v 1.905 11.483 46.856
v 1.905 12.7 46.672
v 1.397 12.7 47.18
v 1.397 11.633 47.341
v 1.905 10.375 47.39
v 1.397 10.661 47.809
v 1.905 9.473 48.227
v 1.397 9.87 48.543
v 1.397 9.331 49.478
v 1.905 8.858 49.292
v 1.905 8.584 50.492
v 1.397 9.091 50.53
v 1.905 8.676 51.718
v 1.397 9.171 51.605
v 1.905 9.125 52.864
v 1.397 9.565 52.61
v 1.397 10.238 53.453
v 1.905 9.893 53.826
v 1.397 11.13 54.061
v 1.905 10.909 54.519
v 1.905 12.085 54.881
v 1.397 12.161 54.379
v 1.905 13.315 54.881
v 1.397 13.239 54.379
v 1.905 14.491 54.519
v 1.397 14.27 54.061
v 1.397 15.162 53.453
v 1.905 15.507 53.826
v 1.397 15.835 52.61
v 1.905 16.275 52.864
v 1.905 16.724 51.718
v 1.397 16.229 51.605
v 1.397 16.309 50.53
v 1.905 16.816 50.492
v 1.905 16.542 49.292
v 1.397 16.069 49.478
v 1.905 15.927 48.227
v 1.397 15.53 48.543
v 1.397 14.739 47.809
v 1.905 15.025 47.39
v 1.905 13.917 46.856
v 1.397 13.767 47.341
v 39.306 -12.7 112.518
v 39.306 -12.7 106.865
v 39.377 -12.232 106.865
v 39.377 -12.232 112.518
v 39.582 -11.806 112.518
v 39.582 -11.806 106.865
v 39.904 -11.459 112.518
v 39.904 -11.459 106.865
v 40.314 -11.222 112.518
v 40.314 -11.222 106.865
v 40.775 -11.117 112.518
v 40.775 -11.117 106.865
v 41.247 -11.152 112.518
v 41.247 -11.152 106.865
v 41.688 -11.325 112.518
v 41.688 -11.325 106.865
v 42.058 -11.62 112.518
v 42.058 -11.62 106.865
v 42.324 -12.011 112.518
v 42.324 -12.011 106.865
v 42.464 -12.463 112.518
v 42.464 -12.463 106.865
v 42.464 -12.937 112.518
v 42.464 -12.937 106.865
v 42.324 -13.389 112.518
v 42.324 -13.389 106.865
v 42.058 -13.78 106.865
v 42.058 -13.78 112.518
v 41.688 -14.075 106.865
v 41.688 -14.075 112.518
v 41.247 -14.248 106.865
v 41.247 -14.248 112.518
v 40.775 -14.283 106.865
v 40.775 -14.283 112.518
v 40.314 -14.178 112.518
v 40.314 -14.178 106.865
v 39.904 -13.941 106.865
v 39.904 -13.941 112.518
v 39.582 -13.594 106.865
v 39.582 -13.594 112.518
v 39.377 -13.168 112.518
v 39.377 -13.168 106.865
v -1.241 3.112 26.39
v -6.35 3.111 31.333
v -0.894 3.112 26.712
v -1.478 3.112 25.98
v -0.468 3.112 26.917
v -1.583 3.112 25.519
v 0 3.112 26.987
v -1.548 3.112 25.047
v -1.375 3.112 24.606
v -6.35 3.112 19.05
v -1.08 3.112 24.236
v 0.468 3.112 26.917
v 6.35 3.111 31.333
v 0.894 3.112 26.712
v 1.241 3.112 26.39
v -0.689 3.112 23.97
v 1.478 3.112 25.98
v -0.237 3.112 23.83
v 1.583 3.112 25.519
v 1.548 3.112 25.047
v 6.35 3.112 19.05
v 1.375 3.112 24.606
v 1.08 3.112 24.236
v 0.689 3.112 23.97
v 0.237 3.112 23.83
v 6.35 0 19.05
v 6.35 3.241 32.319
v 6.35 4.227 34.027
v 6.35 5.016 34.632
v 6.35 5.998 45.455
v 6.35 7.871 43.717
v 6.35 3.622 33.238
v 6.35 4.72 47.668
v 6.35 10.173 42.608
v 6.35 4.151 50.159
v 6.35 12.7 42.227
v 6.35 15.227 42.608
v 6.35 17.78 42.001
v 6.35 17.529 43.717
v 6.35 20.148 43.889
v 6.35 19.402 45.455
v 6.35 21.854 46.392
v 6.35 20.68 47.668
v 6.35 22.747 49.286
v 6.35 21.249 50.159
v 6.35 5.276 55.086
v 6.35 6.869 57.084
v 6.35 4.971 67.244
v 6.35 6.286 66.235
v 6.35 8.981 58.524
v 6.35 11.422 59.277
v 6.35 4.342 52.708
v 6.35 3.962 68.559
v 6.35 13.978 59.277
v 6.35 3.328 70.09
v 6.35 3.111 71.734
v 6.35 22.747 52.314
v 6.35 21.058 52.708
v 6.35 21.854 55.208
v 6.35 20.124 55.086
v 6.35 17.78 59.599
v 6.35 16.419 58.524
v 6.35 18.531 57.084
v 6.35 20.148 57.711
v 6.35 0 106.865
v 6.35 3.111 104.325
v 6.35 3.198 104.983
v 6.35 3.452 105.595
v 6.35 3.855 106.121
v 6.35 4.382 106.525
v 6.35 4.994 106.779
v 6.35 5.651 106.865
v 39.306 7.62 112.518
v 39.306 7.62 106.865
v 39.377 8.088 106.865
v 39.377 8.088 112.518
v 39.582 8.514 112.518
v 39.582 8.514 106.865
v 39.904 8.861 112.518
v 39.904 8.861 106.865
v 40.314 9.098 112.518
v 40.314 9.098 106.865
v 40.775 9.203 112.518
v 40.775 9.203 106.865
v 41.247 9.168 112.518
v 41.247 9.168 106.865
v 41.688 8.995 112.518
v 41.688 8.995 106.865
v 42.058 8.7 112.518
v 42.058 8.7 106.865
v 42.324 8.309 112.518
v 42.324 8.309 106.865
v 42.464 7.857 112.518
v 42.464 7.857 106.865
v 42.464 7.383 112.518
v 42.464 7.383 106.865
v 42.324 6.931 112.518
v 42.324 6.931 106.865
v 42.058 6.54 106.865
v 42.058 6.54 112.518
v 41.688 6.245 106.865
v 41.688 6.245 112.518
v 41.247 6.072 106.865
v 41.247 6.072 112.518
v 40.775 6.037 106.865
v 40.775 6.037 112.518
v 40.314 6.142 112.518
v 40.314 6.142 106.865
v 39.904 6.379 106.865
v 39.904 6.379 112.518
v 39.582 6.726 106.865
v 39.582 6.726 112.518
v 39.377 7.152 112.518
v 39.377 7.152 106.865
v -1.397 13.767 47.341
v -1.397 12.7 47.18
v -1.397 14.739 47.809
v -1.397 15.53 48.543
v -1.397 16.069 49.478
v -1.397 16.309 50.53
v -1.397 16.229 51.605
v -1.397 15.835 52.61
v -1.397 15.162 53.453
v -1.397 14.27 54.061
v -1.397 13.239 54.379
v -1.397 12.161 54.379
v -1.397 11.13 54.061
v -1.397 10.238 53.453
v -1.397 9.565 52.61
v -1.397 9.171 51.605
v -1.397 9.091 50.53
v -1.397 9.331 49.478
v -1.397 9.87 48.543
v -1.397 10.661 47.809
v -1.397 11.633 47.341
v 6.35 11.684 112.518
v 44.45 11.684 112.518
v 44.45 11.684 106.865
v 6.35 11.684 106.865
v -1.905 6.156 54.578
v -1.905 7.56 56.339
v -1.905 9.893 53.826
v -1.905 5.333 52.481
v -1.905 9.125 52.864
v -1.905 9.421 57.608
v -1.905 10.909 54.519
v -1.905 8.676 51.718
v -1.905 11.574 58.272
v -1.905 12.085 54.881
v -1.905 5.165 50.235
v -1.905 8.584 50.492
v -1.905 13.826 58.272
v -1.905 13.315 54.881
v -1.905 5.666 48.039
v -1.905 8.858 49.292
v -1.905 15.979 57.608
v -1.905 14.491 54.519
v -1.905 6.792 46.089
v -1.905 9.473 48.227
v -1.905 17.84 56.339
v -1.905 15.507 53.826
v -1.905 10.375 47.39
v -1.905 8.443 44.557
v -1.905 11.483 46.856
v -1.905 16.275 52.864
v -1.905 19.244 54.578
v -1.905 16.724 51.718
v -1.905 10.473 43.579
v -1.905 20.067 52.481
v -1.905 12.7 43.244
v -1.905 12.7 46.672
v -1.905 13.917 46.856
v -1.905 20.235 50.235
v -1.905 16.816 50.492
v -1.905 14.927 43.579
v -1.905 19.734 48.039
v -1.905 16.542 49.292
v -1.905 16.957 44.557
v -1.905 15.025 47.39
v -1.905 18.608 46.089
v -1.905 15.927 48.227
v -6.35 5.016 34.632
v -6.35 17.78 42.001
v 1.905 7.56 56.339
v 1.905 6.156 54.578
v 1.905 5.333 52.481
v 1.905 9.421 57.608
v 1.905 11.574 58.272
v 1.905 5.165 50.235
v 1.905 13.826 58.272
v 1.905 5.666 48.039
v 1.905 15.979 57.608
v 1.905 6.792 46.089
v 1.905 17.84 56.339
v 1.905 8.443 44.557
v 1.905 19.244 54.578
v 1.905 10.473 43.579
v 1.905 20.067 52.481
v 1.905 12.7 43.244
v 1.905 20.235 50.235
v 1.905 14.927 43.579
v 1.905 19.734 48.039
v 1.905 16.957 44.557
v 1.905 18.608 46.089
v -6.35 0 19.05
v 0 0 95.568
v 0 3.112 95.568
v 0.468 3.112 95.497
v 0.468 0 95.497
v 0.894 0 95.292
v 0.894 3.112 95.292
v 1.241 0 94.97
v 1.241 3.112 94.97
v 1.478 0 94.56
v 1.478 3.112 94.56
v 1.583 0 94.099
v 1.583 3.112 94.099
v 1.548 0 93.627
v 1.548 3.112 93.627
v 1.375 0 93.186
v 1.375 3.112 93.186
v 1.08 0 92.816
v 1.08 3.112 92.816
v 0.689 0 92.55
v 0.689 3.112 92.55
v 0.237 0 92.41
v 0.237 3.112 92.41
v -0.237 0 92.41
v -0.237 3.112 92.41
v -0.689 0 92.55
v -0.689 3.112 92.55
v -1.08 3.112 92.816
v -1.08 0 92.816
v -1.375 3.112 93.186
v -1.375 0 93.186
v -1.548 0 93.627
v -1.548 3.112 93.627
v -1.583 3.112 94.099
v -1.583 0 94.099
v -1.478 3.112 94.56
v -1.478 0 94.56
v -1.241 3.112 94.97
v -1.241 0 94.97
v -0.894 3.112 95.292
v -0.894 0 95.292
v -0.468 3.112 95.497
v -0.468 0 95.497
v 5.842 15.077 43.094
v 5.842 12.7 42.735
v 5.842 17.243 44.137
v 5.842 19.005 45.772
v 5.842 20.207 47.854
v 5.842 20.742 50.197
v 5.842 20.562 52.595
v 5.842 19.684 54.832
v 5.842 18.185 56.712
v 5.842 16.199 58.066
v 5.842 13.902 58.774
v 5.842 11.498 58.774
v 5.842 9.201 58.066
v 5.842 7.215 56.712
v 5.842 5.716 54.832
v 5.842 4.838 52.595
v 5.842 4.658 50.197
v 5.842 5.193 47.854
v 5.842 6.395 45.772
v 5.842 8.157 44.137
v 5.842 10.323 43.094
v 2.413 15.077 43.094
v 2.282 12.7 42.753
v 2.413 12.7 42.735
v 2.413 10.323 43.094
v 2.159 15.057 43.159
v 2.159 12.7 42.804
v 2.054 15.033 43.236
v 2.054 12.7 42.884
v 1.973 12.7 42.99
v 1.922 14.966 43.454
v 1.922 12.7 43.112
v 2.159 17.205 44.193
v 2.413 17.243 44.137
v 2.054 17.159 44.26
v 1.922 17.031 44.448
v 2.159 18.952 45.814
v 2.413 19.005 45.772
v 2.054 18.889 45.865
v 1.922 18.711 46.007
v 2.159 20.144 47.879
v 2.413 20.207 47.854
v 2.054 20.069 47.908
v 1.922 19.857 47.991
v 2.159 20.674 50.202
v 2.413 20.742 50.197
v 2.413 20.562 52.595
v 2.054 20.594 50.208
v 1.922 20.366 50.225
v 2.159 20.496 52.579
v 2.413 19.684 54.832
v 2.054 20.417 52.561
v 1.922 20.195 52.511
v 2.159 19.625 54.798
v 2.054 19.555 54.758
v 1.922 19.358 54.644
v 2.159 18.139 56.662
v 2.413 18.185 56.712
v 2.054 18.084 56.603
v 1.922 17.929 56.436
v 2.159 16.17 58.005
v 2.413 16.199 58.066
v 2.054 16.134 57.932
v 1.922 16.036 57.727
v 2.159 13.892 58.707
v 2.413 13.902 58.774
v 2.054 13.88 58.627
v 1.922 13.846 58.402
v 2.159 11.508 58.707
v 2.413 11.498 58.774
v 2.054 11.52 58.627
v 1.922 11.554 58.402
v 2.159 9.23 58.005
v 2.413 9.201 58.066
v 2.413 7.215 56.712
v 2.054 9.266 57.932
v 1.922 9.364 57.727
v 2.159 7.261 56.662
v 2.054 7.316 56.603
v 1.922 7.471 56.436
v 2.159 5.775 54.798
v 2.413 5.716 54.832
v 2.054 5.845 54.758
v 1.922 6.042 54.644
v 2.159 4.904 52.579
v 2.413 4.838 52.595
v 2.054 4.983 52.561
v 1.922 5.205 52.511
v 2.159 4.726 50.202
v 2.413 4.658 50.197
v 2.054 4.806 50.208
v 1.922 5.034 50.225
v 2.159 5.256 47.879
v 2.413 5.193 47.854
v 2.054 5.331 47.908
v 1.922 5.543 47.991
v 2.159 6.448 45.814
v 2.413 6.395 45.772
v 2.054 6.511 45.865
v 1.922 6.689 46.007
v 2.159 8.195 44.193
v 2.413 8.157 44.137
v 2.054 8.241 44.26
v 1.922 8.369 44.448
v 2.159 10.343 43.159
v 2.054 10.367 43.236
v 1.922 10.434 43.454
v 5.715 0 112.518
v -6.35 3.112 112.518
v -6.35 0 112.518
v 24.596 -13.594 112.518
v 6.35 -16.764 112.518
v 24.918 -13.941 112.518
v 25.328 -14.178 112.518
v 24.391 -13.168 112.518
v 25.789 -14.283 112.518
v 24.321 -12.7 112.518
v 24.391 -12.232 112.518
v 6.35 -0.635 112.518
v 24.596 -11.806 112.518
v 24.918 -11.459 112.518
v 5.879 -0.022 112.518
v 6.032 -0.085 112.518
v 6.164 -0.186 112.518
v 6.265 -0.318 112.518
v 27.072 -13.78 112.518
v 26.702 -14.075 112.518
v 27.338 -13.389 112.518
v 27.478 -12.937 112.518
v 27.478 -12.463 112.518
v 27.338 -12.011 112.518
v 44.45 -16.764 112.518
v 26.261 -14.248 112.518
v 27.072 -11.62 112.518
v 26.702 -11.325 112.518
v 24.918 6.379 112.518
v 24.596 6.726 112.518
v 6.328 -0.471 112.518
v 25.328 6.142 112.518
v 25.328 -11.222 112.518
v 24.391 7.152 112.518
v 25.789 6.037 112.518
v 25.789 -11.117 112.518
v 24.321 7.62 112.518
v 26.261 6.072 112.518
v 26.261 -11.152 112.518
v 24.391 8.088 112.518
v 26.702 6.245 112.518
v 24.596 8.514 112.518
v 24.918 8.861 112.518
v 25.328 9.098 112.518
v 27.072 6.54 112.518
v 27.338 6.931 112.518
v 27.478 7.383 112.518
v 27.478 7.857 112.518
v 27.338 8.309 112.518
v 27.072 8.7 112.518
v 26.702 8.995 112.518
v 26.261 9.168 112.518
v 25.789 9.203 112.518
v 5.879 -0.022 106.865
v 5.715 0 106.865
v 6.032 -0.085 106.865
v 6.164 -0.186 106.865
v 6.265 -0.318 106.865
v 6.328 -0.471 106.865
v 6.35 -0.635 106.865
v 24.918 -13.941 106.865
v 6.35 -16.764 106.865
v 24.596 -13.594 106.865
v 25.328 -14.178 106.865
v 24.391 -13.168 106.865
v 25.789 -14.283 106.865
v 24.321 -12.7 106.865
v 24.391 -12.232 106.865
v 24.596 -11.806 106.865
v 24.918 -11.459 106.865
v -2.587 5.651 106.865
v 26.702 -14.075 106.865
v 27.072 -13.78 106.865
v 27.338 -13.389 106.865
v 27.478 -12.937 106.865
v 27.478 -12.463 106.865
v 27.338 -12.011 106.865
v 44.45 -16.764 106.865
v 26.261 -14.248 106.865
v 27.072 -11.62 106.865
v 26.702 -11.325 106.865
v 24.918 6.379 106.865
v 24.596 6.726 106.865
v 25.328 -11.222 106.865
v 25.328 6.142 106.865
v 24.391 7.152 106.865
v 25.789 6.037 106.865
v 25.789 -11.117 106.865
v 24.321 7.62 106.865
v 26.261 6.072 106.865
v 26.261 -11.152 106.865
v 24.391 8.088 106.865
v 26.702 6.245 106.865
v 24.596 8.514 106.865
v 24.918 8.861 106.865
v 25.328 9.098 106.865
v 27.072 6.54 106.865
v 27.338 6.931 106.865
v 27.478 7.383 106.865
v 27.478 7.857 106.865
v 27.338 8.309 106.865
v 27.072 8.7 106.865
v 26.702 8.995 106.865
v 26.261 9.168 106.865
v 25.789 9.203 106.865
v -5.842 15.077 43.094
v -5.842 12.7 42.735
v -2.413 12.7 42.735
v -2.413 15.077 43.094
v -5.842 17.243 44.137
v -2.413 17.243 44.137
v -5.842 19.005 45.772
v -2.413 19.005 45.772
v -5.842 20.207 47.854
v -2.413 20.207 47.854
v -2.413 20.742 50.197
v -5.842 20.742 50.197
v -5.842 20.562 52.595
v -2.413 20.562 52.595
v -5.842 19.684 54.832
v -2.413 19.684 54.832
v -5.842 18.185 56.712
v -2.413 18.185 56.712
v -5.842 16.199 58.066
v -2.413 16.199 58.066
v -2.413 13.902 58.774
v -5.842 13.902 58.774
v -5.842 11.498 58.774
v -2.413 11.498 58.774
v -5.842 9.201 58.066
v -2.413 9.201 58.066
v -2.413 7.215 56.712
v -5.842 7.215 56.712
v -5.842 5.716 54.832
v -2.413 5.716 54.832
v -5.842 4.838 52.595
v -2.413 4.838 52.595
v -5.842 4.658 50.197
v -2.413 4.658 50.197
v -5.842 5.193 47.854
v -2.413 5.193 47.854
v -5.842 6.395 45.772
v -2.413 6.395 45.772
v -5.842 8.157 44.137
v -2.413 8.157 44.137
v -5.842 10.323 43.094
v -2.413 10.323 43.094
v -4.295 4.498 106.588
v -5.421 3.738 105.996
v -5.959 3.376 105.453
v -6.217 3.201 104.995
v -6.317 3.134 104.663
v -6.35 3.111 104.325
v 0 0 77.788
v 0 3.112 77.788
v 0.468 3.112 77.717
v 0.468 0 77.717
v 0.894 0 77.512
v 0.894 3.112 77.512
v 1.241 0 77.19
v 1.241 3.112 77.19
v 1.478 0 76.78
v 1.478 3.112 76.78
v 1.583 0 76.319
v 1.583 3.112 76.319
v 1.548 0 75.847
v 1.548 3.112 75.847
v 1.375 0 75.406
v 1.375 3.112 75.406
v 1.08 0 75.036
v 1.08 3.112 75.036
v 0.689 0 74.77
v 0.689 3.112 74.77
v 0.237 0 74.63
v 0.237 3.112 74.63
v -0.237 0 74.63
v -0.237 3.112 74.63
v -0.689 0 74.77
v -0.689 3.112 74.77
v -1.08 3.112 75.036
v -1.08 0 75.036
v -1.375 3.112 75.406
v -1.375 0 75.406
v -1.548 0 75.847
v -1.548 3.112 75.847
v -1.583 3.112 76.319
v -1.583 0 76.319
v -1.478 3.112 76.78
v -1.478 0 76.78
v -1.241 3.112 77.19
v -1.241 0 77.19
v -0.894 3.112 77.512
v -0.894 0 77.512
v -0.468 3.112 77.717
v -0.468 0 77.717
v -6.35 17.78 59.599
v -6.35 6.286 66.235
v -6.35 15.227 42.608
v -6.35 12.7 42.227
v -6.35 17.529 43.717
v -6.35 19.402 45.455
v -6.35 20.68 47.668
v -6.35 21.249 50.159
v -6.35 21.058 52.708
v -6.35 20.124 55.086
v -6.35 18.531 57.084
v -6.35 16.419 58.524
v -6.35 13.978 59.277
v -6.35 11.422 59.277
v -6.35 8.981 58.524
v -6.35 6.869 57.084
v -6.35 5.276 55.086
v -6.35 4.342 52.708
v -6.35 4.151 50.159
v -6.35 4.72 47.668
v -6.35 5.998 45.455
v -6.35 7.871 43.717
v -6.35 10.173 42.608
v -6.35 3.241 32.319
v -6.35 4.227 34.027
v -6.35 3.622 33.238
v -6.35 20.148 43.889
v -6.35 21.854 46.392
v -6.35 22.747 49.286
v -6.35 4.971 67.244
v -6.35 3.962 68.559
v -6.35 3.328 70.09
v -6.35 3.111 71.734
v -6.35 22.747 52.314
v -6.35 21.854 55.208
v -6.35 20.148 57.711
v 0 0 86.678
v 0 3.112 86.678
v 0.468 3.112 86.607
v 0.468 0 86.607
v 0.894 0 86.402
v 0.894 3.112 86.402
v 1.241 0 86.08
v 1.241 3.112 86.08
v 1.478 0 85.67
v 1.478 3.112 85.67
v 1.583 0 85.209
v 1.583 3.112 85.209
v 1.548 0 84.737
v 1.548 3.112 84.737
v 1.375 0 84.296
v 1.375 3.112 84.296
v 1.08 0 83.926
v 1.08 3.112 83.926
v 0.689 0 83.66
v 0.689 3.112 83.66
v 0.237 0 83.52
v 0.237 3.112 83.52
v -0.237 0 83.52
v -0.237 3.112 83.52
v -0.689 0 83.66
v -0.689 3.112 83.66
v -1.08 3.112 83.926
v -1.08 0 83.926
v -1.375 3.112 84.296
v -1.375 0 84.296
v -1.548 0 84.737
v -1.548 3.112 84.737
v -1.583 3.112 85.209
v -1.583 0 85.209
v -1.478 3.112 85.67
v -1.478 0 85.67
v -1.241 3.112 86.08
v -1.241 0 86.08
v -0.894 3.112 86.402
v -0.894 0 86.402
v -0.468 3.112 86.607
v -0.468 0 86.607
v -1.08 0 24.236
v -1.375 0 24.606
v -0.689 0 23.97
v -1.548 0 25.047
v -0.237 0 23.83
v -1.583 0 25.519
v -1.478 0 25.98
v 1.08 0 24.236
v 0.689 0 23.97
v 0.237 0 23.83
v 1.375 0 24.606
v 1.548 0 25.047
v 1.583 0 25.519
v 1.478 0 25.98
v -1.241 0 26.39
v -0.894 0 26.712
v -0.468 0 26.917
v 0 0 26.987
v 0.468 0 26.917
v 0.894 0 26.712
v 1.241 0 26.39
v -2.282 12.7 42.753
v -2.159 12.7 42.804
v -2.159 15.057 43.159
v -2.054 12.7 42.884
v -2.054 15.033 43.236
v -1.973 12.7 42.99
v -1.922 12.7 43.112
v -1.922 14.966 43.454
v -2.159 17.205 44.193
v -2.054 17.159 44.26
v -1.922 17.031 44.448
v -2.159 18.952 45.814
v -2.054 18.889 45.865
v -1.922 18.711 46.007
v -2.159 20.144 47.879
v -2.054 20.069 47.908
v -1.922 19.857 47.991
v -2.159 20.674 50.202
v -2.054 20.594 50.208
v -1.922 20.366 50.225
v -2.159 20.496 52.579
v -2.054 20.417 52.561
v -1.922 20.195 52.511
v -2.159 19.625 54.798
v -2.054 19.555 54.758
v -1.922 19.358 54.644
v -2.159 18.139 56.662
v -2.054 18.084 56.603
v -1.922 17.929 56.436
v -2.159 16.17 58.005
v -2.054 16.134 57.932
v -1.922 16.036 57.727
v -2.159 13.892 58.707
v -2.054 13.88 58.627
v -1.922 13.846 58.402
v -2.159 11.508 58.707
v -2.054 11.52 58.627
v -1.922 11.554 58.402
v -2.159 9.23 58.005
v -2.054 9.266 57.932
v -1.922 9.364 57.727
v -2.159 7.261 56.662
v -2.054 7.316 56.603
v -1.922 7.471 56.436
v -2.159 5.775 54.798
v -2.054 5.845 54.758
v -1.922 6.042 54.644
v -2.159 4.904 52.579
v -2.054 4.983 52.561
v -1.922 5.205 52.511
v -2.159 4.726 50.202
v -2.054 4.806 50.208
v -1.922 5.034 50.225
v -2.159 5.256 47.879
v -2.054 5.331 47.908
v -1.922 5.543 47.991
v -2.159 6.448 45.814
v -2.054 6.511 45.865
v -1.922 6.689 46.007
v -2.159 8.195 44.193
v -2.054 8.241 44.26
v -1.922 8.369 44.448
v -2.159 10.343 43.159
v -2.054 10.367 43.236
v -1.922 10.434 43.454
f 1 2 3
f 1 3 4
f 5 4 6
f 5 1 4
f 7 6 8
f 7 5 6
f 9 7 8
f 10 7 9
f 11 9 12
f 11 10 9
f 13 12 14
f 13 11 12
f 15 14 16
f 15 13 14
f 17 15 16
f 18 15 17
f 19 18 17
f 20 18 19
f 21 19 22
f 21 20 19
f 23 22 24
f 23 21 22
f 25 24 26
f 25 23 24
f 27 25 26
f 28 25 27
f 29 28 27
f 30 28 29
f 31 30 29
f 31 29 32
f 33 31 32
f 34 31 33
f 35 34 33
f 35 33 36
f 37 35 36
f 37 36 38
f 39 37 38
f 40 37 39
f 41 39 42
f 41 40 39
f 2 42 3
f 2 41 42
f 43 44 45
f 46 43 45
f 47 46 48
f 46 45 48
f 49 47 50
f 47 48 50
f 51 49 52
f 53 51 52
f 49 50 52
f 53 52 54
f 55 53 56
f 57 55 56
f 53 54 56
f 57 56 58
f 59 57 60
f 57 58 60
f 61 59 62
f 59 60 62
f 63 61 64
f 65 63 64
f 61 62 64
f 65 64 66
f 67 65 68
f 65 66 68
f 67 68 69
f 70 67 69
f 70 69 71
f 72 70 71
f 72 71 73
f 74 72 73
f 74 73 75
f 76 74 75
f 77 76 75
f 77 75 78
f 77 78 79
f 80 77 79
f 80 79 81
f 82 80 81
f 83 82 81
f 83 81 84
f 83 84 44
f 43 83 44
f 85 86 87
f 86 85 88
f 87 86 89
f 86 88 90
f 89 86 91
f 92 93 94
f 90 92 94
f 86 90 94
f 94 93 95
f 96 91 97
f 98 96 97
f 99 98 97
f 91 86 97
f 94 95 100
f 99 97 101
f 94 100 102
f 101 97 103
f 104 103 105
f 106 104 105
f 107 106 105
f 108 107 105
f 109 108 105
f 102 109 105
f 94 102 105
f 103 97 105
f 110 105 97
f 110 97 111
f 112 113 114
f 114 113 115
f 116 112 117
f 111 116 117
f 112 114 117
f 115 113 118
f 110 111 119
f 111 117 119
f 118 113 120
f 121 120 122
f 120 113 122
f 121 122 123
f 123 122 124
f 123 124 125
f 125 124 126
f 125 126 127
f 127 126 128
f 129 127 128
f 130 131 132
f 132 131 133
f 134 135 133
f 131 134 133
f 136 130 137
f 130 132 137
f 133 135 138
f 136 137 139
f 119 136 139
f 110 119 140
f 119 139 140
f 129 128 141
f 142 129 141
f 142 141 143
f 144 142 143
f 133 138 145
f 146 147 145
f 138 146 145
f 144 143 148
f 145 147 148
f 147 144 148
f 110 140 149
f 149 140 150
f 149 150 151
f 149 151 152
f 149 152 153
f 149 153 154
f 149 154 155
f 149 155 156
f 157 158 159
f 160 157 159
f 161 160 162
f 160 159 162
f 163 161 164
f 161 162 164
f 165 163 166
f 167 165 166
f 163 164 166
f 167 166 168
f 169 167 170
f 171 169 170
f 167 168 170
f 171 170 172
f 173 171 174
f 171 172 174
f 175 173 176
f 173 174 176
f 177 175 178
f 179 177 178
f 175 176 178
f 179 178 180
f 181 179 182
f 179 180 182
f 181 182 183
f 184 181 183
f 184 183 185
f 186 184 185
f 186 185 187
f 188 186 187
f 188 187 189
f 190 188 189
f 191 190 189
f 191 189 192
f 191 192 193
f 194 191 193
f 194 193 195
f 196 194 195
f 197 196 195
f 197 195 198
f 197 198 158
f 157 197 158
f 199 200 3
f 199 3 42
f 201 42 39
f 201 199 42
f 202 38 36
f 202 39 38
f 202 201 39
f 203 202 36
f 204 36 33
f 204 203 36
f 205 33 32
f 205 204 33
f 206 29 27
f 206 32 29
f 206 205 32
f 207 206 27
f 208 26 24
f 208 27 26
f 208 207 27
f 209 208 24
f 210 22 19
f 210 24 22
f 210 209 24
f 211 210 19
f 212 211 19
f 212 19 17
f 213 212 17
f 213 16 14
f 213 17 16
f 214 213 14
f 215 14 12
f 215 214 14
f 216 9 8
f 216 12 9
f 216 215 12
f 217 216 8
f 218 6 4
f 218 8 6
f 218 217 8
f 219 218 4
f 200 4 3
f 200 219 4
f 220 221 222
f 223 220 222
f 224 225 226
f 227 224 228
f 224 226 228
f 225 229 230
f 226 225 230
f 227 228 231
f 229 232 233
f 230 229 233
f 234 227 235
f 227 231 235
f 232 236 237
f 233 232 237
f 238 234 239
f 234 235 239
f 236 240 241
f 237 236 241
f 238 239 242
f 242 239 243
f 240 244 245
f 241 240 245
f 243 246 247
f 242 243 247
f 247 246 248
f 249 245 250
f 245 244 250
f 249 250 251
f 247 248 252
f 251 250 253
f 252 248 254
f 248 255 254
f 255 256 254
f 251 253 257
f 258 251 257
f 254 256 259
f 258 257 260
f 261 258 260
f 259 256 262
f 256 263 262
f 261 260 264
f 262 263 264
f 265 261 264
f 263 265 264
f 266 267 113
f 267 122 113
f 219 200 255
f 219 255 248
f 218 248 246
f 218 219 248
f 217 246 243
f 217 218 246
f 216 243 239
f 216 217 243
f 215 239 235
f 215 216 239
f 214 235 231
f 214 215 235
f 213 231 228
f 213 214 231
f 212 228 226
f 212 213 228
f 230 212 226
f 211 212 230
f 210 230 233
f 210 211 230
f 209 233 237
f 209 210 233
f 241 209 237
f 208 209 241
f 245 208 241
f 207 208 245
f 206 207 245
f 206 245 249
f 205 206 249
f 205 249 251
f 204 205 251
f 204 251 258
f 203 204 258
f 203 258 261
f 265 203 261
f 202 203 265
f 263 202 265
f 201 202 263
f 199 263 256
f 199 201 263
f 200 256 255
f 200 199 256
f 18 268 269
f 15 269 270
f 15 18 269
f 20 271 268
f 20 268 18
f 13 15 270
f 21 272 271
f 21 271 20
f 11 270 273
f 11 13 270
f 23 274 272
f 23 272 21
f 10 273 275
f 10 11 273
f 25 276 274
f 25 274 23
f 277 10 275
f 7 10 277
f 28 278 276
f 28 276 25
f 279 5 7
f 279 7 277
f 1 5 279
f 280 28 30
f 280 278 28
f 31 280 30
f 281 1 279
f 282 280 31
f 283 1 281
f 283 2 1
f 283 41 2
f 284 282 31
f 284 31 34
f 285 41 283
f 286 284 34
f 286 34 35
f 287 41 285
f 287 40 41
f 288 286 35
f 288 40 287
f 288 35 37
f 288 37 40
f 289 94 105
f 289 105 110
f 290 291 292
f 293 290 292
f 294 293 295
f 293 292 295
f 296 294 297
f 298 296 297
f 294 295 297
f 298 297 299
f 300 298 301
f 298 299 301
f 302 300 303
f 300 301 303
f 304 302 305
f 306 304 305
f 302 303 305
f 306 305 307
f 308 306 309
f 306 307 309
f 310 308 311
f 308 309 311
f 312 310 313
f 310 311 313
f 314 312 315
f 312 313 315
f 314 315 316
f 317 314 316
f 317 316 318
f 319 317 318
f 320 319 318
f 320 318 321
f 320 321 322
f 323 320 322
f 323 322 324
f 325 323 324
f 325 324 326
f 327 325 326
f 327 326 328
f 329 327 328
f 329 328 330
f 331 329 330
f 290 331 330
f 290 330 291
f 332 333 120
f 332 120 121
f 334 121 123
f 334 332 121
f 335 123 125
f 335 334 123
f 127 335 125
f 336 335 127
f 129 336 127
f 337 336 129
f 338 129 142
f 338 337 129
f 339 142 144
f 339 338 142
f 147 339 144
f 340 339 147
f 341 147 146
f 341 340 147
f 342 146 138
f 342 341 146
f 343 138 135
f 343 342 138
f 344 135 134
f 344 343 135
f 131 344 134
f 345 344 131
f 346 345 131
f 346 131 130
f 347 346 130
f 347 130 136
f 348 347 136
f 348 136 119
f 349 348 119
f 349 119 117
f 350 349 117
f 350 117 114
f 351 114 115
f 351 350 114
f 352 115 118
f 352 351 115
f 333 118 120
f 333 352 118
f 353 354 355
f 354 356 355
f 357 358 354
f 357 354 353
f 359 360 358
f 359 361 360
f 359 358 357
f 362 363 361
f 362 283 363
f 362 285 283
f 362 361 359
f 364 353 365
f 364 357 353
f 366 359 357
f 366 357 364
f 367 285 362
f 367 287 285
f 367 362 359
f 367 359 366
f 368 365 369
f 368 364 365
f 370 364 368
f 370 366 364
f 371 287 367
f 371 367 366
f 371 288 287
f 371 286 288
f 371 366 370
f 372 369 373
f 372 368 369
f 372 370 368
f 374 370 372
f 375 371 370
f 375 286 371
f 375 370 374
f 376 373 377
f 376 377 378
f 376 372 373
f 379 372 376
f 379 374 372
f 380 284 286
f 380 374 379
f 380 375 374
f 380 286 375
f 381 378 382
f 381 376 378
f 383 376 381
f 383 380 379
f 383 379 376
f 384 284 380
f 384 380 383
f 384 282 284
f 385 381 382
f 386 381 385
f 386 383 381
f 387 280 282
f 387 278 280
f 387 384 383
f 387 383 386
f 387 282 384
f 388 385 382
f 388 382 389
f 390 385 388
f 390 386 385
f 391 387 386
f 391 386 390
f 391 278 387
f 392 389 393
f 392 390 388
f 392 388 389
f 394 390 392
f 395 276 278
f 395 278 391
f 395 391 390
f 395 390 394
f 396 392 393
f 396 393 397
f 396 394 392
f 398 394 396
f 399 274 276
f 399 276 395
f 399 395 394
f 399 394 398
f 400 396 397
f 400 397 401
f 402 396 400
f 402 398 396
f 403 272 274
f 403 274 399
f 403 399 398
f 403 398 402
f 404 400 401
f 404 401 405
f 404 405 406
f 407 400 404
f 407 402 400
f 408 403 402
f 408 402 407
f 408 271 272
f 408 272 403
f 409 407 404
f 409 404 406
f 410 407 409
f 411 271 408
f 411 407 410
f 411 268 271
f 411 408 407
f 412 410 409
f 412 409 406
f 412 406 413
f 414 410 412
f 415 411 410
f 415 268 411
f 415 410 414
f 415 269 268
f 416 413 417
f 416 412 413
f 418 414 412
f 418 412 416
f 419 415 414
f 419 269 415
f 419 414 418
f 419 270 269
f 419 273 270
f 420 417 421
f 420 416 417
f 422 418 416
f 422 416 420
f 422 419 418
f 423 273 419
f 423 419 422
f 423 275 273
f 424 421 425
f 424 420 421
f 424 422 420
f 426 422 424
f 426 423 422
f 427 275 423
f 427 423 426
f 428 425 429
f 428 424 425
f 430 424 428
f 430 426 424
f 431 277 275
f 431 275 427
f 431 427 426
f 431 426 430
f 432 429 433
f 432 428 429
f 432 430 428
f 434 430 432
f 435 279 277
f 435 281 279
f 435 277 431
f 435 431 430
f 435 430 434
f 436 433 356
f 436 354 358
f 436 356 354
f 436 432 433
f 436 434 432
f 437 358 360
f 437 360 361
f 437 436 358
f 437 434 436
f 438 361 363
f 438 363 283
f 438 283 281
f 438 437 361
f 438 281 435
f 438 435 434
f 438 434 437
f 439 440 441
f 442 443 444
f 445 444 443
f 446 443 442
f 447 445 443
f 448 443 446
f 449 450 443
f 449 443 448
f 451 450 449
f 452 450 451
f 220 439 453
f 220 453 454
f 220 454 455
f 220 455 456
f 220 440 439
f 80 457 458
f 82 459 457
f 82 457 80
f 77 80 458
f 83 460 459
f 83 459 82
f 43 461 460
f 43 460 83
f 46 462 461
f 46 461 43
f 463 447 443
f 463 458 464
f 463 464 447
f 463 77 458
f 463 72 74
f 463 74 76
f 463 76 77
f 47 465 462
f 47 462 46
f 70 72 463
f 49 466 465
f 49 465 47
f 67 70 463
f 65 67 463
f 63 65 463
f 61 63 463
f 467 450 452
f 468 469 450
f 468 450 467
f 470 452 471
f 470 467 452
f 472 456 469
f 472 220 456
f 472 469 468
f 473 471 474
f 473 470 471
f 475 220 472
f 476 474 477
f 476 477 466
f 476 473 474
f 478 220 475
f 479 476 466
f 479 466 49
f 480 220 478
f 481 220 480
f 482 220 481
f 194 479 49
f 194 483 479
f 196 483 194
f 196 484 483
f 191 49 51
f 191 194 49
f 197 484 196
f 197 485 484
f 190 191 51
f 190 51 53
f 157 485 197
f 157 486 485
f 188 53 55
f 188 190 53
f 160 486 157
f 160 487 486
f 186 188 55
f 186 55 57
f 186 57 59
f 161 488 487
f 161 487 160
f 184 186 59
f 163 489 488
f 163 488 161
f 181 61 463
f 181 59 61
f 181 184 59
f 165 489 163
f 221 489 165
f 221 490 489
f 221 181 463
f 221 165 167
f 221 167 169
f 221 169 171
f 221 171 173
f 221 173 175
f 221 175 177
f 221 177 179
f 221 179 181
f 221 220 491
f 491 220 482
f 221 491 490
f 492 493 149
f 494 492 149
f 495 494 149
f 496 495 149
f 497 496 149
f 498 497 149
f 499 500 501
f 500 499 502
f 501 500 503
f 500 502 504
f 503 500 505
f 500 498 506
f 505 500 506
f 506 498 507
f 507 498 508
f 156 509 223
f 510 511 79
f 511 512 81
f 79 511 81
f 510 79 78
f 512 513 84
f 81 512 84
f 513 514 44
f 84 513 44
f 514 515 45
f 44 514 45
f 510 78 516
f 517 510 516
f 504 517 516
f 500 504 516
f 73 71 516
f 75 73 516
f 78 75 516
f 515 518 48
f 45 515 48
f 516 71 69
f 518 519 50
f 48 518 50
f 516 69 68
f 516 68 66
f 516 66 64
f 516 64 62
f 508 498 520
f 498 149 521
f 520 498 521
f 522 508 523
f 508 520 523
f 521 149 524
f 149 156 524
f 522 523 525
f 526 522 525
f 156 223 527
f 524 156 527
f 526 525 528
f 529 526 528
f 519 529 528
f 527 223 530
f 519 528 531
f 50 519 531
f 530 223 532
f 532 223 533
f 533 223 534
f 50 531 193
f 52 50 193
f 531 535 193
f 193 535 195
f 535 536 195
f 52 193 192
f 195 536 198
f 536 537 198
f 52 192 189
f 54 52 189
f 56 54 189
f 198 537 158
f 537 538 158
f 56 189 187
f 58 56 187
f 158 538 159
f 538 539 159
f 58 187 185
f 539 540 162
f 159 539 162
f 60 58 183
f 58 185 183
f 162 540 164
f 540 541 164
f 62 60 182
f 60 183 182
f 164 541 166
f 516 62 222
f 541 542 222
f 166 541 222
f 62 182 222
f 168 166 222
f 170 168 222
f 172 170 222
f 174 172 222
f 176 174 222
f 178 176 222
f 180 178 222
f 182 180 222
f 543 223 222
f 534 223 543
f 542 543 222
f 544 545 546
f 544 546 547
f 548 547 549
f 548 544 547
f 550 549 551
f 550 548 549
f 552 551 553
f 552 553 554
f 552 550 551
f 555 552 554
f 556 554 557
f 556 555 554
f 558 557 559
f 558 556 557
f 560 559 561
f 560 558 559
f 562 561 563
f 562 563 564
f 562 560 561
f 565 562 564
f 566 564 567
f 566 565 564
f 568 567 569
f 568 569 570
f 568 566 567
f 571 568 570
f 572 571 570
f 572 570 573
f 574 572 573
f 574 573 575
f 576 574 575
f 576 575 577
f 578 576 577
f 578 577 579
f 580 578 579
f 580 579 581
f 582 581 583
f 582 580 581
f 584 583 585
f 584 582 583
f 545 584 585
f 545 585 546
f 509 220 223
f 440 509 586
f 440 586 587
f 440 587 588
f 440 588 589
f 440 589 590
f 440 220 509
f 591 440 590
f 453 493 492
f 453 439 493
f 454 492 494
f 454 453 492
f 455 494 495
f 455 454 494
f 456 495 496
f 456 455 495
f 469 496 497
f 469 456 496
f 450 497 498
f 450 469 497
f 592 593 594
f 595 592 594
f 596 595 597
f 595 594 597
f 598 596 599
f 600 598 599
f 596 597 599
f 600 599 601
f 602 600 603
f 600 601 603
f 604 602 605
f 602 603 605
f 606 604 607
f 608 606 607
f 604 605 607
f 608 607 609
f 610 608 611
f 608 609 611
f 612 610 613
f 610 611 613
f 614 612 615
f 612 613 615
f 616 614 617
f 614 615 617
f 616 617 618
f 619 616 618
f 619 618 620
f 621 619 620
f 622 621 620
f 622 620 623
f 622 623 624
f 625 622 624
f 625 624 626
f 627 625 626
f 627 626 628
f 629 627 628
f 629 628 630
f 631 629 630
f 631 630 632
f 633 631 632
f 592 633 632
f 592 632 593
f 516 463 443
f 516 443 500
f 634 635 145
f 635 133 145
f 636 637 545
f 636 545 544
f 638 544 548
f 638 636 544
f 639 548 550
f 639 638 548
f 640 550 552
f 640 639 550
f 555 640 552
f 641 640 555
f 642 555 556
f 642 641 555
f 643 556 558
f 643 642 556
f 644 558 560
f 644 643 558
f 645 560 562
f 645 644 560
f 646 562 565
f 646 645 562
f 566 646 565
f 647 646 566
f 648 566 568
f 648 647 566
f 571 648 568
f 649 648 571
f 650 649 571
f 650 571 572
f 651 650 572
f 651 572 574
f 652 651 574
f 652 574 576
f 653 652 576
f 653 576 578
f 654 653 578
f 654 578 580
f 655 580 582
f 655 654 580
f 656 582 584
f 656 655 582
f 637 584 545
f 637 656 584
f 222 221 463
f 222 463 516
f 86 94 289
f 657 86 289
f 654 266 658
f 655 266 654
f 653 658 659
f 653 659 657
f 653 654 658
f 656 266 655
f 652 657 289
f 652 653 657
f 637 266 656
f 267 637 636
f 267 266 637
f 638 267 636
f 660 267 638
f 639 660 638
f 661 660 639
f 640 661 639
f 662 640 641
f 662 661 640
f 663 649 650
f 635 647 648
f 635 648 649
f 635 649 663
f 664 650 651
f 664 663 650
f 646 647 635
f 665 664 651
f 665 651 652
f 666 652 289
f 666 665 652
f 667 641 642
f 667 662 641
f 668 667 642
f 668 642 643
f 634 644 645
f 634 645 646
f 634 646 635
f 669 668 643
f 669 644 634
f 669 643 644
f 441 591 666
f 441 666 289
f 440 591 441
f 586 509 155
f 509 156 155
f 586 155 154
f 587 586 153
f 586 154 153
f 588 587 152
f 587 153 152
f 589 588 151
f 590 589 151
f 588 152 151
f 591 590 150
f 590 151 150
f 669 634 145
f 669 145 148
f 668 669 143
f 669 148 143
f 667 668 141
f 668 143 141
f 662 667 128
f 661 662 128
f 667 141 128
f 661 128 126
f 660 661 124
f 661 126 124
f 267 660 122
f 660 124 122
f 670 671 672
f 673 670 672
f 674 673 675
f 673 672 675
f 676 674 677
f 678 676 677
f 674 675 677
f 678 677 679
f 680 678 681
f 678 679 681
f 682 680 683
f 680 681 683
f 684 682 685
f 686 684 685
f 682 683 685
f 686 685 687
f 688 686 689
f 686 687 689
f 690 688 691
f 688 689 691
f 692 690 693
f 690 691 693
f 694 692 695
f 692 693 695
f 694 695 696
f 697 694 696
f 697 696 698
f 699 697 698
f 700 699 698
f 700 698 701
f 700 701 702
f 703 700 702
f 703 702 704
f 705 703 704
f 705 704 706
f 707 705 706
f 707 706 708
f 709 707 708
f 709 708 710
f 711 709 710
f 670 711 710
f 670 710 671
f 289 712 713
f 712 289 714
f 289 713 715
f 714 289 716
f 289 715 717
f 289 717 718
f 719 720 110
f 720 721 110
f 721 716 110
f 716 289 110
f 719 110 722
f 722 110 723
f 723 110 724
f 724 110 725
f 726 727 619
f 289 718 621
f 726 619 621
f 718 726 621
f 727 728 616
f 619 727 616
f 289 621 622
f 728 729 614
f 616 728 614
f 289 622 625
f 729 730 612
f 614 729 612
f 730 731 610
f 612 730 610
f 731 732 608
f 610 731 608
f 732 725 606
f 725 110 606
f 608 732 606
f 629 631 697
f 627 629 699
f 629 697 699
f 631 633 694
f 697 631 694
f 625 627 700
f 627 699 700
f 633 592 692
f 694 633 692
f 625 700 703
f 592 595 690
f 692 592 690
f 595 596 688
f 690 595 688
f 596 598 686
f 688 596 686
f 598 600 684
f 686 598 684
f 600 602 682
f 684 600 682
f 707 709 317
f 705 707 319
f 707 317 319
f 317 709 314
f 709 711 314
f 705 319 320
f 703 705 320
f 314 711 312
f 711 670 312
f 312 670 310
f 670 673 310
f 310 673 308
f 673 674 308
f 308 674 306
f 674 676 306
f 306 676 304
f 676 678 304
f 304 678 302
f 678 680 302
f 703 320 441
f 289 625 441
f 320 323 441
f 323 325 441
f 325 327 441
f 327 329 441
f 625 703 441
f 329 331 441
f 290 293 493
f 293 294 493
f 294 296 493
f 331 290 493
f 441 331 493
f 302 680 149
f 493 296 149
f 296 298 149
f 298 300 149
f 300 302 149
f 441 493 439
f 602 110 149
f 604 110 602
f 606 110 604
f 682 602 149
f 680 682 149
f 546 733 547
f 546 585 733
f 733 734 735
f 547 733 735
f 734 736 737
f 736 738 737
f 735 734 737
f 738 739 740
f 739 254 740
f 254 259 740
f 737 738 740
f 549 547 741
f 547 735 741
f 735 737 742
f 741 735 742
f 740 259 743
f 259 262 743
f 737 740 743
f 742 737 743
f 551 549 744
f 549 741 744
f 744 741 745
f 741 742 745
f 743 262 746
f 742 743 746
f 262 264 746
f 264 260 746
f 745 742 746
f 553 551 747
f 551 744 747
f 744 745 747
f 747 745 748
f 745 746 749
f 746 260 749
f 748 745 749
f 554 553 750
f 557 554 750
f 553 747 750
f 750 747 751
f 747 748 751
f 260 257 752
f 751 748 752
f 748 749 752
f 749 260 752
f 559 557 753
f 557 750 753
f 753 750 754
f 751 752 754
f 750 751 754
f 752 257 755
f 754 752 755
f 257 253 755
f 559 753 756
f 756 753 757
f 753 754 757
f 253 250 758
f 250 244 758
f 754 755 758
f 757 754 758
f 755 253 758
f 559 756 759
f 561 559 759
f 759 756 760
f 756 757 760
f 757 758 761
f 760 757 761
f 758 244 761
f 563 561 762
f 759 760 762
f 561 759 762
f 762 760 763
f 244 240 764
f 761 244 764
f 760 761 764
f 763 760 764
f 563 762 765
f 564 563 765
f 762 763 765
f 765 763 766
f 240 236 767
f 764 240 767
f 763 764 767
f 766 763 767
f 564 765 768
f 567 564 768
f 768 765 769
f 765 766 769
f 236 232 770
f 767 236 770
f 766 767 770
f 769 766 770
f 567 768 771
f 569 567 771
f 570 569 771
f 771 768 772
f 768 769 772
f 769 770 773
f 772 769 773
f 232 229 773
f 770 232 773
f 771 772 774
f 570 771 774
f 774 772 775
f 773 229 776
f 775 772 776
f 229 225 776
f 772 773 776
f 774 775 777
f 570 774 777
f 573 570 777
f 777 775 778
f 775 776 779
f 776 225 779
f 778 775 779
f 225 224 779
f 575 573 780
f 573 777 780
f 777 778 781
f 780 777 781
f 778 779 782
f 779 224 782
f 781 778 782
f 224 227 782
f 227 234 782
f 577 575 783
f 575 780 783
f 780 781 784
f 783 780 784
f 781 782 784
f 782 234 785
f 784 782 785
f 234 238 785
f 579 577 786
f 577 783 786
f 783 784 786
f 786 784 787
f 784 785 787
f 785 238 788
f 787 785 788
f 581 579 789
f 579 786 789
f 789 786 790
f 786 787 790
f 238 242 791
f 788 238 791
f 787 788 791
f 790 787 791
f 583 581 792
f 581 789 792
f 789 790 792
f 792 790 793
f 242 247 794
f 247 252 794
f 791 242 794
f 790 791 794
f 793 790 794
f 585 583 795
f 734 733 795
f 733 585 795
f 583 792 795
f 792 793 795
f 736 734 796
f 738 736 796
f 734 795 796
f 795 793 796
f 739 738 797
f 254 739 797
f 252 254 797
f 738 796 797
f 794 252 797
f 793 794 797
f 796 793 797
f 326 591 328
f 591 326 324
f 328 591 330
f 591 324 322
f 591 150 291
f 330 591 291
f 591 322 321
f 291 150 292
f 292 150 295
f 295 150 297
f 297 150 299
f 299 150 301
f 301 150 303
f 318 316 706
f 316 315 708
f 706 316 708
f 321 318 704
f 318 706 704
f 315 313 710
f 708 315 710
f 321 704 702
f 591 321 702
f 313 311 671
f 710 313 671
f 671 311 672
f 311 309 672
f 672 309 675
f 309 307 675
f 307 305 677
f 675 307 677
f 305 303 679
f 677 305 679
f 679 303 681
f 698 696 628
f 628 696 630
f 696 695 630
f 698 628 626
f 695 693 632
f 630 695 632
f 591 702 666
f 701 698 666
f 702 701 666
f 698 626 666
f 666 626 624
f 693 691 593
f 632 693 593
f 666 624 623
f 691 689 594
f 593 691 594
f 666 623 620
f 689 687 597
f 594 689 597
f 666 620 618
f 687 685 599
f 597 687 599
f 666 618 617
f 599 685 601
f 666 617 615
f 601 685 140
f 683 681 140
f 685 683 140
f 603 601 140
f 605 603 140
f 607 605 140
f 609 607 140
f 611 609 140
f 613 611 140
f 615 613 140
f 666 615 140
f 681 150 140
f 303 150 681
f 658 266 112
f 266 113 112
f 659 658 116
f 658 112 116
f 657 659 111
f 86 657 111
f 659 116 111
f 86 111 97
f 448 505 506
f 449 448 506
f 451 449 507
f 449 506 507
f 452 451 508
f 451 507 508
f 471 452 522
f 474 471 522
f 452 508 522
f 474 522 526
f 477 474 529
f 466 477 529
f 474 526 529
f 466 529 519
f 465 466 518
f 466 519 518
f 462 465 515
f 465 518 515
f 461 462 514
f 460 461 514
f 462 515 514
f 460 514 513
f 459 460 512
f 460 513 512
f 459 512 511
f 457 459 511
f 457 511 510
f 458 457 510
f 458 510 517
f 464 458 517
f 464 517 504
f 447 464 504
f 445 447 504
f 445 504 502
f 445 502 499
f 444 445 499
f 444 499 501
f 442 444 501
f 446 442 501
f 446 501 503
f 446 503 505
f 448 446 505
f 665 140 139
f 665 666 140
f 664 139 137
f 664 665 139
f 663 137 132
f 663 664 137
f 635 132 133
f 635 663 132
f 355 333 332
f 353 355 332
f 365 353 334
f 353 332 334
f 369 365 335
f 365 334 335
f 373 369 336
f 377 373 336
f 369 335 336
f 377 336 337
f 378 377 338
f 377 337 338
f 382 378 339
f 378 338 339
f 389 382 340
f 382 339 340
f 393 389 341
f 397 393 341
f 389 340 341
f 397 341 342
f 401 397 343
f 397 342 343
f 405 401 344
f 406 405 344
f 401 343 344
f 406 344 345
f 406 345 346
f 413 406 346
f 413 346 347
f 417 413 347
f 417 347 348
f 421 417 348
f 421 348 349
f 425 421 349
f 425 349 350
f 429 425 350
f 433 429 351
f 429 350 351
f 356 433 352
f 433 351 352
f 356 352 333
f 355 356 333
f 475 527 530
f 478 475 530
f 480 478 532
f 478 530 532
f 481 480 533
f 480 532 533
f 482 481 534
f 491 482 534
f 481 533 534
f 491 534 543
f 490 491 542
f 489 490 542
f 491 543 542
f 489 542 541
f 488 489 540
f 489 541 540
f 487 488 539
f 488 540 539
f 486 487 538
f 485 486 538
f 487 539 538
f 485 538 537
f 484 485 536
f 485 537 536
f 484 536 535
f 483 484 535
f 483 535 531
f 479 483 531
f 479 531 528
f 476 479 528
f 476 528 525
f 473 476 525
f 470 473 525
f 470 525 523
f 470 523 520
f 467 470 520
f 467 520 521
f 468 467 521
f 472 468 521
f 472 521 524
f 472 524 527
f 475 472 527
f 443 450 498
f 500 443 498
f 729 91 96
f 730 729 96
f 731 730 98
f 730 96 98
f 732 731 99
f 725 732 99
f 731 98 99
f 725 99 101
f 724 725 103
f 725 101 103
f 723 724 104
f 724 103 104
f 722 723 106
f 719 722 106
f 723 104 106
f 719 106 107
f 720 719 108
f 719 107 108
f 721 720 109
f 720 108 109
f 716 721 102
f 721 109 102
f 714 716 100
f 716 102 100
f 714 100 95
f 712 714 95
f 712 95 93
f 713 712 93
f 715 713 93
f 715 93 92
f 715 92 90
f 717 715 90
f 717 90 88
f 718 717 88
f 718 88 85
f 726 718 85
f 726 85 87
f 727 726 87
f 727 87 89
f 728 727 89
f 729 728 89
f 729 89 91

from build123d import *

# Parameters (mm, degrees)
SKETCH2_R                   = 3.6195
BEARING_MOUNT_DEPTH         = 6.35
SKETCH3_R                   = 8.0645
BEARING_HOLE_DEPTH          = 4.445
FILLET1_R                   = 6.35
FILLET2_R                   = 0.508
CHAMFER1_SIZE               = 0.508
SKETCH4_W                   = 5.652455718
SKETCH4_H                   = 28.448
MOTOR_MOUNT_DEPTH           = 38.1
FILLET3_R                   = 3.81
MOTOR_MOUNT_STIFFENER_DEPTH = 5.652455718
SKETCH6_R                   = 1.5875
MOTOR_PLATE_HOLES_DEPTH     = 102.044029057
FILLET4_R                   = 0.635
SKETCH7_R                   = 1.5875
MOUNT_HOLES_DEPTH           = 123.601249713
FILLET5_R                   = 2.54


with BuildPart() as part:
    # Sketch2 → Bearing_Mount (new, symmetric)
    with BuildSketch(Plane(origin=(0, 0, 0), x_dir=(0, 0, -1), z_dir=(1, 0, 0))):
        with BuildLine():
            Line((-19.05, 0), (-112.517680526, 0))
            Line((-112.517680526, 0), (-112.517680526, 3.1115))
            Line((-112.517680526, 3.1115), (-68.067680526, 3.1115))
            Line((-68.067680526, 3.1115), (-59.598818102, 17.78))
            ThreePointArc((-59.598818102, 17.78), (-50.8, 22.86), (-42.001181898, 17.78))
            Line((-42.001181898, 17.78), (-33.532319474, 3.1115))
            Line((-33.532319474, 3.1115), (-19.05, 3.1115))
            Line((-19.05, 3.1115), (-19.05, 0))
        make_face()
        with Locations((-50.8, 12.7)):
            Circle(SKETCH2_R, mode=Mode.SUBTRACT)
    extrude(amount=BEARING_MOUNT_DEPTH, both=True)

    # Sketch3 → Bearing_Hole (cut)
    with BuildSketch(Plane(origin=(6.35, 0, 0), x_dir=(0, 0, -1), z_dir=(1, 0, 0))):
        with Locations((-50.8, 12.7)):
            Circle(SKETCH3_R)
    bearing_hole = extrude(amount=-BEARING_HOLE_DEPTH, mode=Mode.SUBTRACT)

    # Mirror1: Bearing_Hole across plane
    add(bearing_hole.mirror(Plane(origin=(0, 0, 0), x_dir=(0, 0, 1), z_dir=(1, 0, 0))), mode=Mode.SUBTRACT)

    # Fillet1
    fillet1_edges = [part.edges().sort_by_distance(p)[0] for p in [
        (0, 3.1115, 68.067680526),
    ]]
    fillet(fillet1_edges, radius=FILLET1_R)

    # Fillet2
    fillet2_edges = [part.edges().sort_by_distance(p)[0] for p in [
        (1.905, 12.7, 58.8645),
        (-1.905, 12.7, 58.8645),
    ]]
    fillet(fillet2_edges, radius=FILLET2_R)

    # Chamfer1
    chamfer1_edges = [part.edges().sort_by_distance(p)[0] for p in [
        (1.905, 12.7, 54.4195),
        (6.35, 12.7, 58.8645),
        (-6.35, 12.7, 58.8645),
        (-1.905, 12.7, 54.4195),
    ]]
    chamfer(chamfer1_edges, length=CHAMFER1_SIZE)

    # Sketch4 → Motor_Mount (add)
    with BuildSketch(Plane(origin=(6.35, 0, 0), x_dir=(0, 0, -1), z_dir=(1, 0, 0))):
        with Locations((-109.691452667, -2.54)):
            Rectangle(SKETCH4_W, SKETCH4_H)
    extrude(amount=MOTOR_MOUNT_DEPTH)

    # Fillet3
    fillet3_edges = [part.edges().sort_by_distance(p)[0] for p in [
        (0, 3.1115, 33.532319474),
    ]]
    fillet(fillet3_edges, radius=FILLET3_R)

    # Sketch5 → Motor_Mount_Stiffener (add)
    with BuildSketch(Plane.XY.offset(112.517680526)):
        Polygon((6.35, 11.684), (-6.35, 3.1115), (6.35, 3.1115), align=None)
    extrude(amount=-MOTOR_MOUNT_STIFFENER_DEPTH)

    # Sketch6 → Motor_Plate_Holes (cut, through all)
    with BuildSketch(Plane(origin=(0, 0, 106.865224808), x_dir=(-1, 0, 0), z_dir=(0, 0, -1))):
        with Locations((-40.894, 7.62)):
            Circle(SKETCH6_R)
        with Locations((-25.908, 7.62)):
            Circle(SKETCH6_R)
        with Locations((-40.894, -12.7)):
            Circle(SKETCH6_R)
        with Locations((-25.908, -12.7)):
            Circle(SKETCH6_R)
    extrude(amount=-MOTOR_PLATE_HOLES_DEPTH, mode=Mode.SUBTRACT)

    # Fillet4
    fillet4_edges = [part.edges().sort_by_distance(p)[0] for p in [
        (6.35, 0, 109.691452667),
    ]]
    fillet(fillet4_edges, radius=FILLET4_R)

    # Sketch7 → Mount-Holes (cut, through all)
    with BuildSketch(Plane(origin=(0, 3.1115, 0), x_dir=(1, 0, 0), z_dir=(0, 1, 0))):
        with Locations(Location((0, -25.4, 0), (0, 0, 270))):
            Circle(SKETCH7_R)
        with Locations(Location((0, -76.2, 0), (0, 0, 270))):
            Circle(SKETCH7_R)
        with Locations(Location((0, -85.09, 0), (0, 0, 270))):
            Circle(SKETCH7_R)
        with Locations(Location((0, -93.98, 0), (0, 0, 270))):
            Circle(SKETCH7_R)
    extrude(amount=-MOUNT_HOLES_DEPTH, mode=Mode.SUBTRACT)

    # Fillet5
    fillet5_edges = [part.edges().sort_by_distance(p)[0] for p in [
        (0, 3.1115, 106.865224808),
    ]]
    fillet(fillet5_edges, radius=FILLET5_R)


solid = part.part
